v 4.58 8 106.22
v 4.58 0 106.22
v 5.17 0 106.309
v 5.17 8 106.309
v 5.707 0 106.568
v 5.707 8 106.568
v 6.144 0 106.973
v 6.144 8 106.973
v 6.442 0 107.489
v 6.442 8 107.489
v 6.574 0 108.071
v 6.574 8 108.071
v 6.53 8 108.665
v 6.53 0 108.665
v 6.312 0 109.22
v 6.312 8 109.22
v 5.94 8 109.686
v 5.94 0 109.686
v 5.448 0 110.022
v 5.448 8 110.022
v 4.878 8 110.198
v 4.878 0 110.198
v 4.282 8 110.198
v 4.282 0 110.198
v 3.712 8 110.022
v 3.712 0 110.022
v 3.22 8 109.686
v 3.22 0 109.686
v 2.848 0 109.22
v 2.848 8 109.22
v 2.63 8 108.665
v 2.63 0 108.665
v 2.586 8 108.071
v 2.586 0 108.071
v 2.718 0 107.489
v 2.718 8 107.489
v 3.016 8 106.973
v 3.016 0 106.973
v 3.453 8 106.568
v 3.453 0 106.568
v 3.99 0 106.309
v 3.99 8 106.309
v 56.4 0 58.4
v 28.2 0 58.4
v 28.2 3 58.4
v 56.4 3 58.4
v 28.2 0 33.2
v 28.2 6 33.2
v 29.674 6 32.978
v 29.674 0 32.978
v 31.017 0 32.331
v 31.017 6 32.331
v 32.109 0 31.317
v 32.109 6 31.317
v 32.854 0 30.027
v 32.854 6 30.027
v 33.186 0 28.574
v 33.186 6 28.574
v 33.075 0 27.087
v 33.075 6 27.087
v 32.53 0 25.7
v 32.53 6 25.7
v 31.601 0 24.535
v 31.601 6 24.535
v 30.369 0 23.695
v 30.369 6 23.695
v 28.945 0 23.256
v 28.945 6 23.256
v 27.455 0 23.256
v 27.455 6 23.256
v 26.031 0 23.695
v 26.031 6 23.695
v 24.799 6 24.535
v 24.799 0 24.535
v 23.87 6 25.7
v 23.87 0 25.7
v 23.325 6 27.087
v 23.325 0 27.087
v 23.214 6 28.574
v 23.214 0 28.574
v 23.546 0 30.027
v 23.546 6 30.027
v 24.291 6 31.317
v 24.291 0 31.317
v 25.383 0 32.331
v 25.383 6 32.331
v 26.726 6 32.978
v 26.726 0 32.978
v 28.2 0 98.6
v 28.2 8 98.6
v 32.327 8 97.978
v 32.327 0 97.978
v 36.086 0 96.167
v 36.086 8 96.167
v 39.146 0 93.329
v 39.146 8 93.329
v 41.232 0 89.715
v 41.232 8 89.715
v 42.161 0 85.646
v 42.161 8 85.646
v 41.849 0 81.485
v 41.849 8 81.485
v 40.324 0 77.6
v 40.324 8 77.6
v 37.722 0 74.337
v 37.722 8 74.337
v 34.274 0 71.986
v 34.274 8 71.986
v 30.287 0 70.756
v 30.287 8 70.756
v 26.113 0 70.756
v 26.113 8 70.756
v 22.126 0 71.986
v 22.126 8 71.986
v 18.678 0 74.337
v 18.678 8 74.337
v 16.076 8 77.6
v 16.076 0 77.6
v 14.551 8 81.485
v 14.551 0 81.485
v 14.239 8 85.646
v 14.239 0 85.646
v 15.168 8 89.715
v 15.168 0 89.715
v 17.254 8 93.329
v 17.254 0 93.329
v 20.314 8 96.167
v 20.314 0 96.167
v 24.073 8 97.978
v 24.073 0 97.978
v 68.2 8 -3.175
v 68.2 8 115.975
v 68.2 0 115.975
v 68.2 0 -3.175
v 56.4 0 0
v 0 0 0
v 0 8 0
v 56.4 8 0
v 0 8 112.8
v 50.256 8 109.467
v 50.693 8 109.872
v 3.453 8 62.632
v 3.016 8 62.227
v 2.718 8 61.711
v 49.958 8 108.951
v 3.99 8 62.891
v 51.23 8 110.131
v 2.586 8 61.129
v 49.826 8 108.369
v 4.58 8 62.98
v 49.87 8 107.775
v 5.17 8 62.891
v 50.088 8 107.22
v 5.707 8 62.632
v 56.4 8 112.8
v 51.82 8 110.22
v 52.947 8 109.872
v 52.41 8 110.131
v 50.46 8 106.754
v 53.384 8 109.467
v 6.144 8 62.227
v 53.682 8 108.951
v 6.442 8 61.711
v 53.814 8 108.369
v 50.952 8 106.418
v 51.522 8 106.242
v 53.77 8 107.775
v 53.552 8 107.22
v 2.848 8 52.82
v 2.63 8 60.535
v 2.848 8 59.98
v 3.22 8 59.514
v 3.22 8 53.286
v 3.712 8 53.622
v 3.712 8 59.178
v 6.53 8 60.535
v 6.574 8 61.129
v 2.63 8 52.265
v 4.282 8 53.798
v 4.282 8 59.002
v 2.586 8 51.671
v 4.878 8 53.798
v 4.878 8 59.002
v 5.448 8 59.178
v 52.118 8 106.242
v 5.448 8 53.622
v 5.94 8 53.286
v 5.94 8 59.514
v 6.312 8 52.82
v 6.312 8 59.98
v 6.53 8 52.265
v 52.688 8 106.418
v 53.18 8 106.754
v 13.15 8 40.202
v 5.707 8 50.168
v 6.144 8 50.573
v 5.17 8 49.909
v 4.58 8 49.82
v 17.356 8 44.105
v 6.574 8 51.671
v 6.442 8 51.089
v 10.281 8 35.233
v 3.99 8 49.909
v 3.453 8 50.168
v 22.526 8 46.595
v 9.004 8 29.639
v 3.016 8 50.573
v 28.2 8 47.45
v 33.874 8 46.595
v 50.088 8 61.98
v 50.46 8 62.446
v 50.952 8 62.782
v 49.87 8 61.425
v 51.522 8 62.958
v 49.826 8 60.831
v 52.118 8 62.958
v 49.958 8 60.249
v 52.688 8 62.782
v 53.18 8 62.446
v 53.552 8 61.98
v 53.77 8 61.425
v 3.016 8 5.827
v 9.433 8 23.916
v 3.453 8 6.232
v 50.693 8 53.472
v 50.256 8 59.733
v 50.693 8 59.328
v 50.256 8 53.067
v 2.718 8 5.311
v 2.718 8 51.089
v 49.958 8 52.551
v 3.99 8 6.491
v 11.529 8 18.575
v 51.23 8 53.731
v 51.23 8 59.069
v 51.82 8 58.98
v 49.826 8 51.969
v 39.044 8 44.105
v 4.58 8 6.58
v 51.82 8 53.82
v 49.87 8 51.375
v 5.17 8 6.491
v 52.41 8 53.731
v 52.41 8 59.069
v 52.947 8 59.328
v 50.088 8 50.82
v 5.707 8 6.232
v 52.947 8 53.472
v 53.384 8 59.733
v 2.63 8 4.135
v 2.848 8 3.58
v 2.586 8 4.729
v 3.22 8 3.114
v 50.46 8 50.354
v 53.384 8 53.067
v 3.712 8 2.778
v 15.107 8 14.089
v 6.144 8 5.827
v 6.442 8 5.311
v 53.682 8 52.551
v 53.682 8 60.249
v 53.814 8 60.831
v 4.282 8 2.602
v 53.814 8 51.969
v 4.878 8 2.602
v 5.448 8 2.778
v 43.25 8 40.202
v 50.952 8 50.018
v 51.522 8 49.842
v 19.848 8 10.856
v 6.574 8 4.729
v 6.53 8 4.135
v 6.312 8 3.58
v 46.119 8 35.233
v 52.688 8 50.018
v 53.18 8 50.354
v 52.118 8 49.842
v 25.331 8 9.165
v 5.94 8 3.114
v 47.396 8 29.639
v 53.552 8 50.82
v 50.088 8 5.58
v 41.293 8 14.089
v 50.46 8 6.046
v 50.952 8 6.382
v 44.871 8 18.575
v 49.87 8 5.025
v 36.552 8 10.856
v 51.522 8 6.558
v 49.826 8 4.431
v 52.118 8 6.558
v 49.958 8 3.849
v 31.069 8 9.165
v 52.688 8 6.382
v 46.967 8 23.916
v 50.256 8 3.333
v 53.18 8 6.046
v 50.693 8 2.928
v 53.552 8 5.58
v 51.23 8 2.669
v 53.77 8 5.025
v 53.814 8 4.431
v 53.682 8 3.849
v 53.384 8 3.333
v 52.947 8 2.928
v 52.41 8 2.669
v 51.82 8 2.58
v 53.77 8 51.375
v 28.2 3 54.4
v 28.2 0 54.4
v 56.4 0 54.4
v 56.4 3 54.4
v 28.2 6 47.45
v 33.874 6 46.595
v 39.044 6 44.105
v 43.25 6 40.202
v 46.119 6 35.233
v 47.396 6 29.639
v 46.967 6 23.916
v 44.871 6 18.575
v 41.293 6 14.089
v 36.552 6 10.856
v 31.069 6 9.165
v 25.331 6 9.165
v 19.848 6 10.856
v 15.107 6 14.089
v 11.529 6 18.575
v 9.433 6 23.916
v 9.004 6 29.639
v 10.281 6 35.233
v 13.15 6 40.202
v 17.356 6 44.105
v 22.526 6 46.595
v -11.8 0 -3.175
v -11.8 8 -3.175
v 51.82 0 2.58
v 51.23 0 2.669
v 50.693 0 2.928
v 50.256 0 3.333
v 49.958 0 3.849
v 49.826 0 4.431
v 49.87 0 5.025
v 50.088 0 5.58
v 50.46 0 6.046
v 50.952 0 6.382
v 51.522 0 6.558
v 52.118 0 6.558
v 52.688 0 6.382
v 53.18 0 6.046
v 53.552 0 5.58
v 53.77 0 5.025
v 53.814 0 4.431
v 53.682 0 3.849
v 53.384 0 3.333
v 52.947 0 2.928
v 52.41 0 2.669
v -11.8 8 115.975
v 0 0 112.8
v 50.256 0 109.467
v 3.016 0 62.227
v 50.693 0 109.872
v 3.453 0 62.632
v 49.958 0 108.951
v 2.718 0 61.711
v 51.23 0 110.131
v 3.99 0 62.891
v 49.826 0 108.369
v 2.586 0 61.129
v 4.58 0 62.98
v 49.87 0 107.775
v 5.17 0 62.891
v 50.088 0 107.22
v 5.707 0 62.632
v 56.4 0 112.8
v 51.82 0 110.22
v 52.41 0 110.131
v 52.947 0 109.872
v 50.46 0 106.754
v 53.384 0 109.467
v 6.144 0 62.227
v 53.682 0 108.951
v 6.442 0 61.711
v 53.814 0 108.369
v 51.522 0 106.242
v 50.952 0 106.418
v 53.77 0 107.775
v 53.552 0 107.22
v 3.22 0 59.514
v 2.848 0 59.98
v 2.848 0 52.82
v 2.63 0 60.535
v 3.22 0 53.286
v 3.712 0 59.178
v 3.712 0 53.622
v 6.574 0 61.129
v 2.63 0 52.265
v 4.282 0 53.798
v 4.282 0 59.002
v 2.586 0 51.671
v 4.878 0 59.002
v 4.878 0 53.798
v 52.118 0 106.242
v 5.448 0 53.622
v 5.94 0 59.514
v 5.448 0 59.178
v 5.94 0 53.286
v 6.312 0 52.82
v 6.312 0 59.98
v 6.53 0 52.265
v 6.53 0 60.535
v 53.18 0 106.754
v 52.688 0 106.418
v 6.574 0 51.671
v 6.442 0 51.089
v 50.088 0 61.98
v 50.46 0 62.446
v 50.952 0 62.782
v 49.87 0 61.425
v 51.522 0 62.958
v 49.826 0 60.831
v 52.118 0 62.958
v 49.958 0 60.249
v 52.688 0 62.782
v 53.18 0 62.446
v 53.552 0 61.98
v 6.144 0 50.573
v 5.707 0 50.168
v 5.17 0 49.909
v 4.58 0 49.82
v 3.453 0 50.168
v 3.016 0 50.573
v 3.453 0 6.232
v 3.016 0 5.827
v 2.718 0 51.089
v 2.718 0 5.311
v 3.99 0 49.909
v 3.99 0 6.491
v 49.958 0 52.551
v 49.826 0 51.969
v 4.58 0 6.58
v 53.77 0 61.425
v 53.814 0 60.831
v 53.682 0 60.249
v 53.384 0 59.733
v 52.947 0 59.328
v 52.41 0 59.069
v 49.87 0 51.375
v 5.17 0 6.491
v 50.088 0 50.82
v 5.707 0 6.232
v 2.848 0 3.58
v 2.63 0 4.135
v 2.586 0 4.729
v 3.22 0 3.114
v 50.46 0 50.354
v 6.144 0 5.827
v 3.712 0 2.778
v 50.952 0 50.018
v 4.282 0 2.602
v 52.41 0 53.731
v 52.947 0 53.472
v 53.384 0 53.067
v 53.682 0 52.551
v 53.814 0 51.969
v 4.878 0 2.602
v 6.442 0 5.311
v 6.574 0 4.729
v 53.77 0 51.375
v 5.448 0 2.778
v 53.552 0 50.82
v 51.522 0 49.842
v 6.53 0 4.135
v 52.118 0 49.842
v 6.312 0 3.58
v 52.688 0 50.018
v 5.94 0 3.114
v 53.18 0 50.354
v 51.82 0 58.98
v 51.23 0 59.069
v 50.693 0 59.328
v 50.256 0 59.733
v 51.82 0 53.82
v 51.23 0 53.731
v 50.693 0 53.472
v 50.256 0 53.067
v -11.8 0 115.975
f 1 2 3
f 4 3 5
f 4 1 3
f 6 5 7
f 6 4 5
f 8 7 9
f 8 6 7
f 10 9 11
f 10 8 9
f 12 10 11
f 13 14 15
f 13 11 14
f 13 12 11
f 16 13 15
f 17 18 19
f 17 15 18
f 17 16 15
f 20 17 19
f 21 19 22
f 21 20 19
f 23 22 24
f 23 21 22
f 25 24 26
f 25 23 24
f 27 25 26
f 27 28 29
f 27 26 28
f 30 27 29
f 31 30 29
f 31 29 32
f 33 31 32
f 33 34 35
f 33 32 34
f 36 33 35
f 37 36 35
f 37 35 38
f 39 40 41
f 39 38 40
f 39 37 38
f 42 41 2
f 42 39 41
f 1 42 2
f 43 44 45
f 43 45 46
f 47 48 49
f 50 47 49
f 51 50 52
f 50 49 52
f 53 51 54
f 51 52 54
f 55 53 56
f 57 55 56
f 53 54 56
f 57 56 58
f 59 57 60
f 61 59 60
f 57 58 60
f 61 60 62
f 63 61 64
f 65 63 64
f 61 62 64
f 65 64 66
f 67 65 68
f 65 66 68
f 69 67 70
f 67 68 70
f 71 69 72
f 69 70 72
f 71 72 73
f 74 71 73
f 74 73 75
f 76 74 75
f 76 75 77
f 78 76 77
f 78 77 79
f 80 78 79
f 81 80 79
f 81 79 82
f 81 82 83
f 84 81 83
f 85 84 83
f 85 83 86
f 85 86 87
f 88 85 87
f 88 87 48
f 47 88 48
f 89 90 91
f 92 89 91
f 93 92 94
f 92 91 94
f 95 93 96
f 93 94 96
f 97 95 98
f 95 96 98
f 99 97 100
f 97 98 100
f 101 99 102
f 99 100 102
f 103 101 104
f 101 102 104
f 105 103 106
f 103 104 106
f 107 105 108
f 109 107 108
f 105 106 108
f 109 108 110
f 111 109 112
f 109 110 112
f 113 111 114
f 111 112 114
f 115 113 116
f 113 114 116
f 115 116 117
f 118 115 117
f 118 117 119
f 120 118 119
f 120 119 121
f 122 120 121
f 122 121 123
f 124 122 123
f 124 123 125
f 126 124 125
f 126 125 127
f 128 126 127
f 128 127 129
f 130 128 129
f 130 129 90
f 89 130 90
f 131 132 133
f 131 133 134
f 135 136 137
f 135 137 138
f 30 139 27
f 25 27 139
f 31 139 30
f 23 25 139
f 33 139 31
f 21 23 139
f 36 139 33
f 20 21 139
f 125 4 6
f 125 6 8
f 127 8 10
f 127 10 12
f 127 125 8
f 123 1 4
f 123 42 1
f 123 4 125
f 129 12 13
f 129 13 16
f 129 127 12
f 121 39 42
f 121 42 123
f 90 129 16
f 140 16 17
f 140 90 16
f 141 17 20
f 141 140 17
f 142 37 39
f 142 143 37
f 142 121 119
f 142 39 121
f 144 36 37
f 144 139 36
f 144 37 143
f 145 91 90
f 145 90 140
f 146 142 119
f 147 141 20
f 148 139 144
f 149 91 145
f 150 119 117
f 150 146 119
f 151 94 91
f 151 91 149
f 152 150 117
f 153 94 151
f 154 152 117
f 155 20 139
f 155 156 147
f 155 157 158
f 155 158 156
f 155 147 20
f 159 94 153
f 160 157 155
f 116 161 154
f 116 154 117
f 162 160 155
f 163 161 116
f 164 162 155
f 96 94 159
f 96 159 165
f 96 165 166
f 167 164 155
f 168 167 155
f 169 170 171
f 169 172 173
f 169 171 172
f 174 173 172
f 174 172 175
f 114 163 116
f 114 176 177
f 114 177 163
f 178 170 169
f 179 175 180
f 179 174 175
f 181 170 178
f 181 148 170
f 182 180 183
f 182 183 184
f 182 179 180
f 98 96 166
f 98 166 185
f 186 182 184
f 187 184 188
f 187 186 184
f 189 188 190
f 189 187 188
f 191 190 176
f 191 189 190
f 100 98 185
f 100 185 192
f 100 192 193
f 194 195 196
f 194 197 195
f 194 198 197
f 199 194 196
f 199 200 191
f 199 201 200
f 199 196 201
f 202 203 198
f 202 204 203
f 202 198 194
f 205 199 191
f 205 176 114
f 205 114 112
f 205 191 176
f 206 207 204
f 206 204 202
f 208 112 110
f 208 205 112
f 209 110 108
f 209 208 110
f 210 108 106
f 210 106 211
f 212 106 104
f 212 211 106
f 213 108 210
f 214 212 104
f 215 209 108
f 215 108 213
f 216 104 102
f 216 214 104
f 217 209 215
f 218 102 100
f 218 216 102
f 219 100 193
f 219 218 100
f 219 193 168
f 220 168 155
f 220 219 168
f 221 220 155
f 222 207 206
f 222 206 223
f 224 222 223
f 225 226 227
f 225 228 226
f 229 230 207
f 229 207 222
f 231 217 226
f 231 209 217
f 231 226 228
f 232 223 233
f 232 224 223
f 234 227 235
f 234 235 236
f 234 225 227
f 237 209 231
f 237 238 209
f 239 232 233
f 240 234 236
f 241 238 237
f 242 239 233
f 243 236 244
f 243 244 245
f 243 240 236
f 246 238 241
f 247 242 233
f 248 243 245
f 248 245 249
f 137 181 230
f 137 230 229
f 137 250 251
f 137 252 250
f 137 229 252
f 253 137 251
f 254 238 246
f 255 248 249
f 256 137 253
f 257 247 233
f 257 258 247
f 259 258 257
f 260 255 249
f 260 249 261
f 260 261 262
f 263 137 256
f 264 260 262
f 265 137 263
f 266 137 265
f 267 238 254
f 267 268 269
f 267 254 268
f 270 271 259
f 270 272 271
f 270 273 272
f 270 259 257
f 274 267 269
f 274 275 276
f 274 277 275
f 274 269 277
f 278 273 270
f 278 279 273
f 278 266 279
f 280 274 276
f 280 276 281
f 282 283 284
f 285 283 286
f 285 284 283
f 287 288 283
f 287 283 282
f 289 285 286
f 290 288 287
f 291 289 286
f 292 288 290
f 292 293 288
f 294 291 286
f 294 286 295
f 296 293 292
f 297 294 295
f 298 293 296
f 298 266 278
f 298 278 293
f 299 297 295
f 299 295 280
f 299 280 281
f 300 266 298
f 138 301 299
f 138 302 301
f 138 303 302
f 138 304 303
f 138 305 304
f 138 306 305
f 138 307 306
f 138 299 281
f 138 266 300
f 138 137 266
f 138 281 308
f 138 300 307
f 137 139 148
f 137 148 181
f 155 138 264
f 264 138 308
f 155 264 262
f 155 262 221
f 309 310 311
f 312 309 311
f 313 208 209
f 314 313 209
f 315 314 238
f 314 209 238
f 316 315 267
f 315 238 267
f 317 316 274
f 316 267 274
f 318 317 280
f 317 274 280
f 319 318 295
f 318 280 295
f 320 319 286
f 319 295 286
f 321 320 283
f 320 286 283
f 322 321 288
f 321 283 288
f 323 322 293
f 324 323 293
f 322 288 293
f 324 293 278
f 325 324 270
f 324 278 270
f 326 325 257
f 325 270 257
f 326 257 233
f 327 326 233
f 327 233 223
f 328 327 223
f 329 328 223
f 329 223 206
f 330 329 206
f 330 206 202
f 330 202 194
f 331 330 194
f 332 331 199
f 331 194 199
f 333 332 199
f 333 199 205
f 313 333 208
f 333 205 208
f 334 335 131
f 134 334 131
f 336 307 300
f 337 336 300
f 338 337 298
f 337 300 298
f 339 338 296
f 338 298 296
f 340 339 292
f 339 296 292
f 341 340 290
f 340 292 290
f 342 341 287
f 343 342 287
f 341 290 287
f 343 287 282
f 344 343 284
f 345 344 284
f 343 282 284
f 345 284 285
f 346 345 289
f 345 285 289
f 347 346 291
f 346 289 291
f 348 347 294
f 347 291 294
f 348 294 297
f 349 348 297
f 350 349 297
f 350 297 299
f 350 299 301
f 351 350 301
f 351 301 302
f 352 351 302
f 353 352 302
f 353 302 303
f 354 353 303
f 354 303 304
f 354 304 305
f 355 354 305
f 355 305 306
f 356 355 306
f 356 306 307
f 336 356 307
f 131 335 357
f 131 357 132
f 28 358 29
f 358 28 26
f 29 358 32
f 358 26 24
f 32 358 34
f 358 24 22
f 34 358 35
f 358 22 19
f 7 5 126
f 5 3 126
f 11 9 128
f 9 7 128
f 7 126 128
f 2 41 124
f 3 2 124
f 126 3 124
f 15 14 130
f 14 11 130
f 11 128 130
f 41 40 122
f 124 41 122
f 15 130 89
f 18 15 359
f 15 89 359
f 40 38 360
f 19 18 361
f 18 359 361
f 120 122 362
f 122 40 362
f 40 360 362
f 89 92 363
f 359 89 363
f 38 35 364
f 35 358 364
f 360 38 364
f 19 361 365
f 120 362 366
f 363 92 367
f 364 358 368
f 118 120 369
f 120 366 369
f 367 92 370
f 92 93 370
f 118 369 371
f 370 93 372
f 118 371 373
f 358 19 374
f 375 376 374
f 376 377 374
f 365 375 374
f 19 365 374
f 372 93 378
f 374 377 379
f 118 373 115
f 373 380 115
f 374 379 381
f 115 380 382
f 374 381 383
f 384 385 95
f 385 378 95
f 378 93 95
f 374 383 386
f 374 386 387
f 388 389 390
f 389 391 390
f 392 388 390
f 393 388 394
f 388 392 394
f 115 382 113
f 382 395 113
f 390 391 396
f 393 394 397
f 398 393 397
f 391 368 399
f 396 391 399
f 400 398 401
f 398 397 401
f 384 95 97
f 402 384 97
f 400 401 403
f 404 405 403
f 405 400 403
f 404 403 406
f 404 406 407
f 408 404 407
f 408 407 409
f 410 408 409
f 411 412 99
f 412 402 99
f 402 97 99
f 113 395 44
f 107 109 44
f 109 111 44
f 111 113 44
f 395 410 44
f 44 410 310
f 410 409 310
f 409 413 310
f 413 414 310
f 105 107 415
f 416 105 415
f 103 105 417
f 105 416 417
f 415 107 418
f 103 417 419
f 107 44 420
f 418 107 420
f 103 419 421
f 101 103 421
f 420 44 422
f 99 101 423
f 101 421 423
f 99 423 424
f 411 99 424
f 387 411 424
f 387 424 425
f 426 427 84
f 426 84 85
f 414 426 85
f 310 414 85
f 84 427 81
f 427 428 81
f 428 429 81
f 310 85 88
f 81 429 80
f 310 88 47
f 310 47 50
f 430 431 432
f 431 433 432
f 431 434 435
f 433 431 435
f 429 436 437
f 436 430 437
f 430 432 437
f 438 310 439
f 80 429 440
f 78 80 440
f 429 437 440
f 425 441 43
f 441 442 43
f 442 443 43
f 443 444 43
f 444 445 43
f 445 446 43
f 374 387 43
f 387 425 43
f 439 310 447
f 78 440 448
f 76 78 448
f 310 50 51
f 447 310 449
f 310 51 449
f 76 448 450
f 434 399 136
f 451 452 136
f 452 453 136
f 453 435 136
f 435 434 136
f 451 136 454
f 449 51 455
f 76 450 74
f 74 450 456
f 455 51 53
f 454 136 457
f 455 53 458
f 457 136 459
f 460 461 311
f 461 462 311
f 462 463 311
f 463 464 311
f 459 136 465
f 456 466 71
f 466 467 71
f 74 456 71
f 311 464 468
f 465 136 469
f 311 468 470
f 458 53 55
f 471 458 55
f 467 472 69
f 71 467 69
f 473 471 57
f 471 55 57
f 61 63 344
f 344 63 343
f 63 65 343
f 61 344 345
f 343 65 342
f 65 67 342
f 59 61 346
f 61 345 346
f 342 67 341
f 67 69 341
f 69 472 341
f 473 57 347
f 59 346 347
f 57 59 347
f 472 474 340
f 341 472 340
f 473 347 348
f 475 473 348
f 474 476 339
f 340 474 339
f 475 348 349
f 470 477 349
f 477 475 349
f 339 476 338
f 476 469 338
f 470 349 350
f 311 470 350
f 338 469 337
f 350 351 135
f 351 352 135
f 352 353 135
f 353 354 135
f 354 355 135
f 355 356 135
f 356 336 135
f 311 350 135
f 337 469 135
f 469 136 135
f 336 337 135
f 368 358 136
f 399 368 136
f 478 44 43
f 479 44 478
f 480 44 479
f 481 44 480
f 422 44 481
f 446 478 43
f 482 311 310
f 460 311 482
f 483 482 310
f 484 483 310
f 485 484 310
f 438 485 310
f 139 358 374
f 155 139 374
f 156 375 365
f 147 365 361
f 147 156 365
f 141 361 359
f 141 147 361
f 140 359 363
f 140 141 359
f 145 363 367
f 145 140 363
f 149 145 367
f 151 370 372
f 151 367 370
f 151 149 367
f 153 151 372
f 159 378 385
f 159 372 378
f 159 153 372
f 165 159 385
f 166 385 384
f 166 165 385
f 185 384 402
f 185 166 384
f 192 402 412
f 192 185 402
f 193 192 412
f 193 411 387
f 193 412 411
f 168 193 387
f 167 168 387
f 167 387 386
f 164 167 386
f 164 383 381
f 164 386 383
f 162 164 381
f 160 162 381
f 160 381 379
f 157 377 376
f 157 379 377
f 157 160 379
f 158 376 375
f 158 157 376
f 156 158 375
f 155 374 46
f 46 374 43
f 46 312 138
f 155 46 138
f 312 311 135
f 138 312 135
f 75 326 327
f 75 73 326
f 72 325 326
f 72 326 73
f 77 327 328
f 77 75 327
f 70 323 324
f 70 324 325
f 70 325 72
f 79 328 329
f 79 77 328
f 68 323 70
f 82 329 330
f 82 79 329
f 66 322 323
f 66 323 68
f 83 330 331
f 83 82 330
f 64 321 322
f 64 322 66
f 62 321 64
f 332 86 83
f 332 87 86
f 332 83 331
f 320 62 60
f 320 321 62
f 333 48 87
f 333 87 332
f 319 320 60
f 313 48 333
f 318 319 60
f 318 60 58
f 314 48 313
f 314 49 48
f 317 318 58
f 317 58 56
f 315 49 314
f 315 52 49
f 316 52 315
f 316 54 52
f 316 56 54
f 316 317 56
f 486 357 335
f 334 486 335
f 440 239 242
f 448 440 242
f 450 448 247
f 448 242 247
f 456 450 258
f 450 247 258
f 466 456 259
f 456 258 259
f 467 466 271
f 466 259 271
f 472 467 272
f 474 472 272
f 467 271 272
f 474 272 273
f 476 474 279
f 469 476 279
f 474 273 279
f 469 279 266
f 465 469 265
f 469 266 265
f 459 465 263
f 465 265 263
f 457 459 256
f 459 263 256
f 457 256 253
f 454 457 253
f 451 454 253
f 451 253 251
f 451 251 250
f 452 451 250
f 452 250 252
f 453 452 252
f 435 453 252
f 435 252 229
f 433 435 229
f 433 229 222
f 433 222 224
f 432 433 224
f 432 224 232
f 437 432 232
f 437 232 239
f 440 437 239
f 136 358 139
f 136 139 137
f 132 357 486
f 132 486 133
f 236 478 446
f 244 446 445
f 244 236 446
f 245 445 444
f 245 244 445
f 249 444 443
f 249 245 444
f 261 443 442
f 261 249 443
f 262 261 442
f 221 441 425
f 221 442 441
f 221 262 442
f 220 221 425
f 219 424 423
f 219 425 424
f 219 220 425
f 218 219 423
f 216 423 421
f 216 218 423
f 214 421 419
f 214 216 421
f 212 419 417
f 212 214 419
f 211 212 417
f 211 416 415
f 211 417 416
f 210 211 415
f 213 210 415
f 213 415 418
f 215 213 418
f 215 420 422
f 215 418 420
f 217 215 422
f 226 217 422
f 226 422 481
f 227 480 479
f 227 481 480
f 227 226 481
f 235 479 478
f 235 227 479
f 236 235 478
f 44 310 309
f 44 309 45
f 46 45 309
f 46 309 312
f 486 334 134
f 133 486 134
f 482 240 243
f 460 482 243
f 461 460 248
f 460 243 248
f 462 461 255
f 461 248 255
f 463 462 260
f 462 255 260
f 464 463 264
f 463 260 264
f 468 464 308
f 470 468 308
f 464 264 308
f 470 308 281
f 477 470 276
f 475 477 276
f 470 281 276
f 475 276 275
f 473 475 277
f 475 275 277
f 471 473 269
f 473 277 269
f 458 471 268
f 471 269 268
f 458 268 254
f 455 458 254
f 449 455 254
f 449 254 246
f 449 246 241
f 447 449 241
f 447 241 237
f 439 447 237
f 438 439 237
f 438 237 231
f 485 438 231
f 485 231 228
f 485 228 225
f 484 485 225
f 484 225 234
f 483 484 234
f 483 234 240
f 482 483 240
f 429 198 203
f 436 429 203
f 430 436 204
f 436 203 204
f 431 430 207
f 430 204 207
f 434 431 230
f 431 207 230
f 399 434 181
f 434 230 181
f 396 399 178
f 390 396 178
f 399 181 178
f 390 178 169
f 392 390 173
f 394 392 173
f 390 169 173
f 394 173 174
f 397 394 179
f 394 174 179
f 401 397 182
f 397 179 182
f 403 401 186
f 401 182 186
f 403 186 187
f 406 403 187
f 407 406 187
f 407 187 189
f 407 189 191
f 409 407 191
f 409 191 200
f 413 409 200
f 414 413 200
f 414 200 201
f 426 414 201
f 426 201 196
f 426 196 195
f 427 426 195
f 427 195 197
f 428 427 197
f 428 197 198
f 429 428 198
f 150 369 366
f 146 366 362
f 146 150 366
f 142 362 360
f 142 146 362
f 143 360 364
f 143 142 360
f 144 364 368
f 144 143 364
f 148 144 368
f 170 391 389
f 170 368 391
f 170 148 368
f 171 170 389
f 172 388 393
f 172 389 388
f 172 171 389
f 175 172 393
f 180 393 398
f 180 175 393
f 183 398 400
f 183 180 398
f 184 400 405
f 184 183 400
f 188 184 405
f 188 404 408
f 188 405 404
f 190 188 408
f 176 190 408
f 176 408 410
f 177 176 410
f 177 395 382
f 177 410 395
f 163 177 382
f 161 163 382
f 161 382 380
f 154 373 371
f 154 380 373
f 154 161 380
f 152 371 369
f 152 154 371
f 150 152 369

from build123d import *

# Parameters (mm, degrees)
SKETCH1_W           = 56.4
SKETCH1_H           = 112.8
BOSS_EXTRUDE1_DEPTH = 8
SKETCH2_R           = 19.25
CUT_EXTRUDE1_DEPTH  = 2
SKETCH3_R           = 5
CUT_EXTRUDE2_DEPTH  = 127.256881001
SKETCH4_R           = 2
CUT_EXTRUDE3_DEPTH  = 127.367717396
SKETCH5_R           = 14
CUT_EXTRUDE4_DEPTH  = 127.367717396
SKETCH6_W           = 80
SKETCH6_H           = 119.15
BOSS_EXTRUDE2_DEPTH = 8
SKETCH9_W           = 29
SKETCH9_H           = 4
CUT_EXTRUDE5_DEPTH  = 3


with BuildPart() as part:
    # Sketch1 → Boss-Extrude1 (new body)
    with BuildSketch(Plane(origin=(0, 0, 0), x_dir=(1, 0, 0), z_dir=(0, 1, 0))):
        with Locations((28.2, -56.4)):
            Rectangle(SKETCH1_W, SKETCH1_H)
    extrude(amount=BOSS_EXTRUDE1_DEPTH)

    # Sketch2 → Cut-Extrude1 (cut)
    with BuildSketch(Plane(origin=(0, 8, 0), x_dir=(1, 0, 0), z_dir=(0, 1, 0))):
        with Locations((28.2, -28.2)):
            Circle(SKETCH2_R)
    extrude(amount=-CUT_EXTRUDE1_DEPTH, mode=Mode.SUBTRACT)

    # Sketch3 → Cut-Extrude2 (cut, through all)
    with BuildSketch(Plane(origin=(0, 6, 0), x_dir=(1, 0, 0), z_dir=(0, 1, 0))):
        with Locations((28.2, -28.2)):
            Circle(SKETCH3_R)
    extrude(amount=-CUT_EXTRUDE2_DEPTH, mode=Mode.SUBTRACT)

    # Sketch4 → Cut-Extrude3 (cut, through all)
    with BuildSketch(Plane(origin=(0, 8, 0), x_dir=(1, 0, 0), z_dir=(0, 1, 0))):
        with Locations((4.58, -4.58)):
            Circle(SKETCH4_R)
        with Locations((51.82, -4.58)):
            Circle(SKETCH4_R)
        with Locations((51.82, -51.82)):
            Circle(SKETCH4_R)
        with Locations((4.58, -51.82)):
            Circle(SKETCH4_R)
    cut_extrude3 = extrude(amount=-CUT_EXTRUDE3_DEPTH, mode=Mode.SUBTRACT)

    # Sketch5 → Cut-Extrude4 (cut, through all)
    with BuildSketch(Plane(origin=(0, 8, 0), x_dir=(1, 0, 0), z_dir=(0, 1, 0))):
        with Locations((28.2, -84.6)):
            Circle(SKETCH5_R)
    extrude(amount=-CUT_EXTRUDE4_DEPTH, mode=Mode.SUBTRACT)

    # Mirror1: Cut-Extrude3 across plane
    add(cut_extrude3.mirror(Plane.XY.offset(56.4)), mode=Mode.SUBTRACT)

    # Sketch9 → Cut-Extrude5 (cut)
    with BuildSketch(Plane.XZ):
        with Locations((42.7, 56.4)):
            Rectangle(SKETCH9_W, SKETCH9_H)
    extrude(amount=-CUT_EXTRUDE5_DEPTH, mode=Mode.SUBTRACT)


with BuildPart() as body_2:
    # Sketch6 → Boss-Extrude2 (new body)
    with BuildSketch(Plane(origin=(0, 8, 0), x_dir=(1, 0, 0), z_dir=(0, 1, 0))):
        with Locations((28.2, -56.4)):
            Rectangle(SKETCH6_W, SKETCH6_H)
    extrude(amount=-BOSS_EXTRUDE2_DEPTH)


solid = Compound([part.part, body_2.part])
